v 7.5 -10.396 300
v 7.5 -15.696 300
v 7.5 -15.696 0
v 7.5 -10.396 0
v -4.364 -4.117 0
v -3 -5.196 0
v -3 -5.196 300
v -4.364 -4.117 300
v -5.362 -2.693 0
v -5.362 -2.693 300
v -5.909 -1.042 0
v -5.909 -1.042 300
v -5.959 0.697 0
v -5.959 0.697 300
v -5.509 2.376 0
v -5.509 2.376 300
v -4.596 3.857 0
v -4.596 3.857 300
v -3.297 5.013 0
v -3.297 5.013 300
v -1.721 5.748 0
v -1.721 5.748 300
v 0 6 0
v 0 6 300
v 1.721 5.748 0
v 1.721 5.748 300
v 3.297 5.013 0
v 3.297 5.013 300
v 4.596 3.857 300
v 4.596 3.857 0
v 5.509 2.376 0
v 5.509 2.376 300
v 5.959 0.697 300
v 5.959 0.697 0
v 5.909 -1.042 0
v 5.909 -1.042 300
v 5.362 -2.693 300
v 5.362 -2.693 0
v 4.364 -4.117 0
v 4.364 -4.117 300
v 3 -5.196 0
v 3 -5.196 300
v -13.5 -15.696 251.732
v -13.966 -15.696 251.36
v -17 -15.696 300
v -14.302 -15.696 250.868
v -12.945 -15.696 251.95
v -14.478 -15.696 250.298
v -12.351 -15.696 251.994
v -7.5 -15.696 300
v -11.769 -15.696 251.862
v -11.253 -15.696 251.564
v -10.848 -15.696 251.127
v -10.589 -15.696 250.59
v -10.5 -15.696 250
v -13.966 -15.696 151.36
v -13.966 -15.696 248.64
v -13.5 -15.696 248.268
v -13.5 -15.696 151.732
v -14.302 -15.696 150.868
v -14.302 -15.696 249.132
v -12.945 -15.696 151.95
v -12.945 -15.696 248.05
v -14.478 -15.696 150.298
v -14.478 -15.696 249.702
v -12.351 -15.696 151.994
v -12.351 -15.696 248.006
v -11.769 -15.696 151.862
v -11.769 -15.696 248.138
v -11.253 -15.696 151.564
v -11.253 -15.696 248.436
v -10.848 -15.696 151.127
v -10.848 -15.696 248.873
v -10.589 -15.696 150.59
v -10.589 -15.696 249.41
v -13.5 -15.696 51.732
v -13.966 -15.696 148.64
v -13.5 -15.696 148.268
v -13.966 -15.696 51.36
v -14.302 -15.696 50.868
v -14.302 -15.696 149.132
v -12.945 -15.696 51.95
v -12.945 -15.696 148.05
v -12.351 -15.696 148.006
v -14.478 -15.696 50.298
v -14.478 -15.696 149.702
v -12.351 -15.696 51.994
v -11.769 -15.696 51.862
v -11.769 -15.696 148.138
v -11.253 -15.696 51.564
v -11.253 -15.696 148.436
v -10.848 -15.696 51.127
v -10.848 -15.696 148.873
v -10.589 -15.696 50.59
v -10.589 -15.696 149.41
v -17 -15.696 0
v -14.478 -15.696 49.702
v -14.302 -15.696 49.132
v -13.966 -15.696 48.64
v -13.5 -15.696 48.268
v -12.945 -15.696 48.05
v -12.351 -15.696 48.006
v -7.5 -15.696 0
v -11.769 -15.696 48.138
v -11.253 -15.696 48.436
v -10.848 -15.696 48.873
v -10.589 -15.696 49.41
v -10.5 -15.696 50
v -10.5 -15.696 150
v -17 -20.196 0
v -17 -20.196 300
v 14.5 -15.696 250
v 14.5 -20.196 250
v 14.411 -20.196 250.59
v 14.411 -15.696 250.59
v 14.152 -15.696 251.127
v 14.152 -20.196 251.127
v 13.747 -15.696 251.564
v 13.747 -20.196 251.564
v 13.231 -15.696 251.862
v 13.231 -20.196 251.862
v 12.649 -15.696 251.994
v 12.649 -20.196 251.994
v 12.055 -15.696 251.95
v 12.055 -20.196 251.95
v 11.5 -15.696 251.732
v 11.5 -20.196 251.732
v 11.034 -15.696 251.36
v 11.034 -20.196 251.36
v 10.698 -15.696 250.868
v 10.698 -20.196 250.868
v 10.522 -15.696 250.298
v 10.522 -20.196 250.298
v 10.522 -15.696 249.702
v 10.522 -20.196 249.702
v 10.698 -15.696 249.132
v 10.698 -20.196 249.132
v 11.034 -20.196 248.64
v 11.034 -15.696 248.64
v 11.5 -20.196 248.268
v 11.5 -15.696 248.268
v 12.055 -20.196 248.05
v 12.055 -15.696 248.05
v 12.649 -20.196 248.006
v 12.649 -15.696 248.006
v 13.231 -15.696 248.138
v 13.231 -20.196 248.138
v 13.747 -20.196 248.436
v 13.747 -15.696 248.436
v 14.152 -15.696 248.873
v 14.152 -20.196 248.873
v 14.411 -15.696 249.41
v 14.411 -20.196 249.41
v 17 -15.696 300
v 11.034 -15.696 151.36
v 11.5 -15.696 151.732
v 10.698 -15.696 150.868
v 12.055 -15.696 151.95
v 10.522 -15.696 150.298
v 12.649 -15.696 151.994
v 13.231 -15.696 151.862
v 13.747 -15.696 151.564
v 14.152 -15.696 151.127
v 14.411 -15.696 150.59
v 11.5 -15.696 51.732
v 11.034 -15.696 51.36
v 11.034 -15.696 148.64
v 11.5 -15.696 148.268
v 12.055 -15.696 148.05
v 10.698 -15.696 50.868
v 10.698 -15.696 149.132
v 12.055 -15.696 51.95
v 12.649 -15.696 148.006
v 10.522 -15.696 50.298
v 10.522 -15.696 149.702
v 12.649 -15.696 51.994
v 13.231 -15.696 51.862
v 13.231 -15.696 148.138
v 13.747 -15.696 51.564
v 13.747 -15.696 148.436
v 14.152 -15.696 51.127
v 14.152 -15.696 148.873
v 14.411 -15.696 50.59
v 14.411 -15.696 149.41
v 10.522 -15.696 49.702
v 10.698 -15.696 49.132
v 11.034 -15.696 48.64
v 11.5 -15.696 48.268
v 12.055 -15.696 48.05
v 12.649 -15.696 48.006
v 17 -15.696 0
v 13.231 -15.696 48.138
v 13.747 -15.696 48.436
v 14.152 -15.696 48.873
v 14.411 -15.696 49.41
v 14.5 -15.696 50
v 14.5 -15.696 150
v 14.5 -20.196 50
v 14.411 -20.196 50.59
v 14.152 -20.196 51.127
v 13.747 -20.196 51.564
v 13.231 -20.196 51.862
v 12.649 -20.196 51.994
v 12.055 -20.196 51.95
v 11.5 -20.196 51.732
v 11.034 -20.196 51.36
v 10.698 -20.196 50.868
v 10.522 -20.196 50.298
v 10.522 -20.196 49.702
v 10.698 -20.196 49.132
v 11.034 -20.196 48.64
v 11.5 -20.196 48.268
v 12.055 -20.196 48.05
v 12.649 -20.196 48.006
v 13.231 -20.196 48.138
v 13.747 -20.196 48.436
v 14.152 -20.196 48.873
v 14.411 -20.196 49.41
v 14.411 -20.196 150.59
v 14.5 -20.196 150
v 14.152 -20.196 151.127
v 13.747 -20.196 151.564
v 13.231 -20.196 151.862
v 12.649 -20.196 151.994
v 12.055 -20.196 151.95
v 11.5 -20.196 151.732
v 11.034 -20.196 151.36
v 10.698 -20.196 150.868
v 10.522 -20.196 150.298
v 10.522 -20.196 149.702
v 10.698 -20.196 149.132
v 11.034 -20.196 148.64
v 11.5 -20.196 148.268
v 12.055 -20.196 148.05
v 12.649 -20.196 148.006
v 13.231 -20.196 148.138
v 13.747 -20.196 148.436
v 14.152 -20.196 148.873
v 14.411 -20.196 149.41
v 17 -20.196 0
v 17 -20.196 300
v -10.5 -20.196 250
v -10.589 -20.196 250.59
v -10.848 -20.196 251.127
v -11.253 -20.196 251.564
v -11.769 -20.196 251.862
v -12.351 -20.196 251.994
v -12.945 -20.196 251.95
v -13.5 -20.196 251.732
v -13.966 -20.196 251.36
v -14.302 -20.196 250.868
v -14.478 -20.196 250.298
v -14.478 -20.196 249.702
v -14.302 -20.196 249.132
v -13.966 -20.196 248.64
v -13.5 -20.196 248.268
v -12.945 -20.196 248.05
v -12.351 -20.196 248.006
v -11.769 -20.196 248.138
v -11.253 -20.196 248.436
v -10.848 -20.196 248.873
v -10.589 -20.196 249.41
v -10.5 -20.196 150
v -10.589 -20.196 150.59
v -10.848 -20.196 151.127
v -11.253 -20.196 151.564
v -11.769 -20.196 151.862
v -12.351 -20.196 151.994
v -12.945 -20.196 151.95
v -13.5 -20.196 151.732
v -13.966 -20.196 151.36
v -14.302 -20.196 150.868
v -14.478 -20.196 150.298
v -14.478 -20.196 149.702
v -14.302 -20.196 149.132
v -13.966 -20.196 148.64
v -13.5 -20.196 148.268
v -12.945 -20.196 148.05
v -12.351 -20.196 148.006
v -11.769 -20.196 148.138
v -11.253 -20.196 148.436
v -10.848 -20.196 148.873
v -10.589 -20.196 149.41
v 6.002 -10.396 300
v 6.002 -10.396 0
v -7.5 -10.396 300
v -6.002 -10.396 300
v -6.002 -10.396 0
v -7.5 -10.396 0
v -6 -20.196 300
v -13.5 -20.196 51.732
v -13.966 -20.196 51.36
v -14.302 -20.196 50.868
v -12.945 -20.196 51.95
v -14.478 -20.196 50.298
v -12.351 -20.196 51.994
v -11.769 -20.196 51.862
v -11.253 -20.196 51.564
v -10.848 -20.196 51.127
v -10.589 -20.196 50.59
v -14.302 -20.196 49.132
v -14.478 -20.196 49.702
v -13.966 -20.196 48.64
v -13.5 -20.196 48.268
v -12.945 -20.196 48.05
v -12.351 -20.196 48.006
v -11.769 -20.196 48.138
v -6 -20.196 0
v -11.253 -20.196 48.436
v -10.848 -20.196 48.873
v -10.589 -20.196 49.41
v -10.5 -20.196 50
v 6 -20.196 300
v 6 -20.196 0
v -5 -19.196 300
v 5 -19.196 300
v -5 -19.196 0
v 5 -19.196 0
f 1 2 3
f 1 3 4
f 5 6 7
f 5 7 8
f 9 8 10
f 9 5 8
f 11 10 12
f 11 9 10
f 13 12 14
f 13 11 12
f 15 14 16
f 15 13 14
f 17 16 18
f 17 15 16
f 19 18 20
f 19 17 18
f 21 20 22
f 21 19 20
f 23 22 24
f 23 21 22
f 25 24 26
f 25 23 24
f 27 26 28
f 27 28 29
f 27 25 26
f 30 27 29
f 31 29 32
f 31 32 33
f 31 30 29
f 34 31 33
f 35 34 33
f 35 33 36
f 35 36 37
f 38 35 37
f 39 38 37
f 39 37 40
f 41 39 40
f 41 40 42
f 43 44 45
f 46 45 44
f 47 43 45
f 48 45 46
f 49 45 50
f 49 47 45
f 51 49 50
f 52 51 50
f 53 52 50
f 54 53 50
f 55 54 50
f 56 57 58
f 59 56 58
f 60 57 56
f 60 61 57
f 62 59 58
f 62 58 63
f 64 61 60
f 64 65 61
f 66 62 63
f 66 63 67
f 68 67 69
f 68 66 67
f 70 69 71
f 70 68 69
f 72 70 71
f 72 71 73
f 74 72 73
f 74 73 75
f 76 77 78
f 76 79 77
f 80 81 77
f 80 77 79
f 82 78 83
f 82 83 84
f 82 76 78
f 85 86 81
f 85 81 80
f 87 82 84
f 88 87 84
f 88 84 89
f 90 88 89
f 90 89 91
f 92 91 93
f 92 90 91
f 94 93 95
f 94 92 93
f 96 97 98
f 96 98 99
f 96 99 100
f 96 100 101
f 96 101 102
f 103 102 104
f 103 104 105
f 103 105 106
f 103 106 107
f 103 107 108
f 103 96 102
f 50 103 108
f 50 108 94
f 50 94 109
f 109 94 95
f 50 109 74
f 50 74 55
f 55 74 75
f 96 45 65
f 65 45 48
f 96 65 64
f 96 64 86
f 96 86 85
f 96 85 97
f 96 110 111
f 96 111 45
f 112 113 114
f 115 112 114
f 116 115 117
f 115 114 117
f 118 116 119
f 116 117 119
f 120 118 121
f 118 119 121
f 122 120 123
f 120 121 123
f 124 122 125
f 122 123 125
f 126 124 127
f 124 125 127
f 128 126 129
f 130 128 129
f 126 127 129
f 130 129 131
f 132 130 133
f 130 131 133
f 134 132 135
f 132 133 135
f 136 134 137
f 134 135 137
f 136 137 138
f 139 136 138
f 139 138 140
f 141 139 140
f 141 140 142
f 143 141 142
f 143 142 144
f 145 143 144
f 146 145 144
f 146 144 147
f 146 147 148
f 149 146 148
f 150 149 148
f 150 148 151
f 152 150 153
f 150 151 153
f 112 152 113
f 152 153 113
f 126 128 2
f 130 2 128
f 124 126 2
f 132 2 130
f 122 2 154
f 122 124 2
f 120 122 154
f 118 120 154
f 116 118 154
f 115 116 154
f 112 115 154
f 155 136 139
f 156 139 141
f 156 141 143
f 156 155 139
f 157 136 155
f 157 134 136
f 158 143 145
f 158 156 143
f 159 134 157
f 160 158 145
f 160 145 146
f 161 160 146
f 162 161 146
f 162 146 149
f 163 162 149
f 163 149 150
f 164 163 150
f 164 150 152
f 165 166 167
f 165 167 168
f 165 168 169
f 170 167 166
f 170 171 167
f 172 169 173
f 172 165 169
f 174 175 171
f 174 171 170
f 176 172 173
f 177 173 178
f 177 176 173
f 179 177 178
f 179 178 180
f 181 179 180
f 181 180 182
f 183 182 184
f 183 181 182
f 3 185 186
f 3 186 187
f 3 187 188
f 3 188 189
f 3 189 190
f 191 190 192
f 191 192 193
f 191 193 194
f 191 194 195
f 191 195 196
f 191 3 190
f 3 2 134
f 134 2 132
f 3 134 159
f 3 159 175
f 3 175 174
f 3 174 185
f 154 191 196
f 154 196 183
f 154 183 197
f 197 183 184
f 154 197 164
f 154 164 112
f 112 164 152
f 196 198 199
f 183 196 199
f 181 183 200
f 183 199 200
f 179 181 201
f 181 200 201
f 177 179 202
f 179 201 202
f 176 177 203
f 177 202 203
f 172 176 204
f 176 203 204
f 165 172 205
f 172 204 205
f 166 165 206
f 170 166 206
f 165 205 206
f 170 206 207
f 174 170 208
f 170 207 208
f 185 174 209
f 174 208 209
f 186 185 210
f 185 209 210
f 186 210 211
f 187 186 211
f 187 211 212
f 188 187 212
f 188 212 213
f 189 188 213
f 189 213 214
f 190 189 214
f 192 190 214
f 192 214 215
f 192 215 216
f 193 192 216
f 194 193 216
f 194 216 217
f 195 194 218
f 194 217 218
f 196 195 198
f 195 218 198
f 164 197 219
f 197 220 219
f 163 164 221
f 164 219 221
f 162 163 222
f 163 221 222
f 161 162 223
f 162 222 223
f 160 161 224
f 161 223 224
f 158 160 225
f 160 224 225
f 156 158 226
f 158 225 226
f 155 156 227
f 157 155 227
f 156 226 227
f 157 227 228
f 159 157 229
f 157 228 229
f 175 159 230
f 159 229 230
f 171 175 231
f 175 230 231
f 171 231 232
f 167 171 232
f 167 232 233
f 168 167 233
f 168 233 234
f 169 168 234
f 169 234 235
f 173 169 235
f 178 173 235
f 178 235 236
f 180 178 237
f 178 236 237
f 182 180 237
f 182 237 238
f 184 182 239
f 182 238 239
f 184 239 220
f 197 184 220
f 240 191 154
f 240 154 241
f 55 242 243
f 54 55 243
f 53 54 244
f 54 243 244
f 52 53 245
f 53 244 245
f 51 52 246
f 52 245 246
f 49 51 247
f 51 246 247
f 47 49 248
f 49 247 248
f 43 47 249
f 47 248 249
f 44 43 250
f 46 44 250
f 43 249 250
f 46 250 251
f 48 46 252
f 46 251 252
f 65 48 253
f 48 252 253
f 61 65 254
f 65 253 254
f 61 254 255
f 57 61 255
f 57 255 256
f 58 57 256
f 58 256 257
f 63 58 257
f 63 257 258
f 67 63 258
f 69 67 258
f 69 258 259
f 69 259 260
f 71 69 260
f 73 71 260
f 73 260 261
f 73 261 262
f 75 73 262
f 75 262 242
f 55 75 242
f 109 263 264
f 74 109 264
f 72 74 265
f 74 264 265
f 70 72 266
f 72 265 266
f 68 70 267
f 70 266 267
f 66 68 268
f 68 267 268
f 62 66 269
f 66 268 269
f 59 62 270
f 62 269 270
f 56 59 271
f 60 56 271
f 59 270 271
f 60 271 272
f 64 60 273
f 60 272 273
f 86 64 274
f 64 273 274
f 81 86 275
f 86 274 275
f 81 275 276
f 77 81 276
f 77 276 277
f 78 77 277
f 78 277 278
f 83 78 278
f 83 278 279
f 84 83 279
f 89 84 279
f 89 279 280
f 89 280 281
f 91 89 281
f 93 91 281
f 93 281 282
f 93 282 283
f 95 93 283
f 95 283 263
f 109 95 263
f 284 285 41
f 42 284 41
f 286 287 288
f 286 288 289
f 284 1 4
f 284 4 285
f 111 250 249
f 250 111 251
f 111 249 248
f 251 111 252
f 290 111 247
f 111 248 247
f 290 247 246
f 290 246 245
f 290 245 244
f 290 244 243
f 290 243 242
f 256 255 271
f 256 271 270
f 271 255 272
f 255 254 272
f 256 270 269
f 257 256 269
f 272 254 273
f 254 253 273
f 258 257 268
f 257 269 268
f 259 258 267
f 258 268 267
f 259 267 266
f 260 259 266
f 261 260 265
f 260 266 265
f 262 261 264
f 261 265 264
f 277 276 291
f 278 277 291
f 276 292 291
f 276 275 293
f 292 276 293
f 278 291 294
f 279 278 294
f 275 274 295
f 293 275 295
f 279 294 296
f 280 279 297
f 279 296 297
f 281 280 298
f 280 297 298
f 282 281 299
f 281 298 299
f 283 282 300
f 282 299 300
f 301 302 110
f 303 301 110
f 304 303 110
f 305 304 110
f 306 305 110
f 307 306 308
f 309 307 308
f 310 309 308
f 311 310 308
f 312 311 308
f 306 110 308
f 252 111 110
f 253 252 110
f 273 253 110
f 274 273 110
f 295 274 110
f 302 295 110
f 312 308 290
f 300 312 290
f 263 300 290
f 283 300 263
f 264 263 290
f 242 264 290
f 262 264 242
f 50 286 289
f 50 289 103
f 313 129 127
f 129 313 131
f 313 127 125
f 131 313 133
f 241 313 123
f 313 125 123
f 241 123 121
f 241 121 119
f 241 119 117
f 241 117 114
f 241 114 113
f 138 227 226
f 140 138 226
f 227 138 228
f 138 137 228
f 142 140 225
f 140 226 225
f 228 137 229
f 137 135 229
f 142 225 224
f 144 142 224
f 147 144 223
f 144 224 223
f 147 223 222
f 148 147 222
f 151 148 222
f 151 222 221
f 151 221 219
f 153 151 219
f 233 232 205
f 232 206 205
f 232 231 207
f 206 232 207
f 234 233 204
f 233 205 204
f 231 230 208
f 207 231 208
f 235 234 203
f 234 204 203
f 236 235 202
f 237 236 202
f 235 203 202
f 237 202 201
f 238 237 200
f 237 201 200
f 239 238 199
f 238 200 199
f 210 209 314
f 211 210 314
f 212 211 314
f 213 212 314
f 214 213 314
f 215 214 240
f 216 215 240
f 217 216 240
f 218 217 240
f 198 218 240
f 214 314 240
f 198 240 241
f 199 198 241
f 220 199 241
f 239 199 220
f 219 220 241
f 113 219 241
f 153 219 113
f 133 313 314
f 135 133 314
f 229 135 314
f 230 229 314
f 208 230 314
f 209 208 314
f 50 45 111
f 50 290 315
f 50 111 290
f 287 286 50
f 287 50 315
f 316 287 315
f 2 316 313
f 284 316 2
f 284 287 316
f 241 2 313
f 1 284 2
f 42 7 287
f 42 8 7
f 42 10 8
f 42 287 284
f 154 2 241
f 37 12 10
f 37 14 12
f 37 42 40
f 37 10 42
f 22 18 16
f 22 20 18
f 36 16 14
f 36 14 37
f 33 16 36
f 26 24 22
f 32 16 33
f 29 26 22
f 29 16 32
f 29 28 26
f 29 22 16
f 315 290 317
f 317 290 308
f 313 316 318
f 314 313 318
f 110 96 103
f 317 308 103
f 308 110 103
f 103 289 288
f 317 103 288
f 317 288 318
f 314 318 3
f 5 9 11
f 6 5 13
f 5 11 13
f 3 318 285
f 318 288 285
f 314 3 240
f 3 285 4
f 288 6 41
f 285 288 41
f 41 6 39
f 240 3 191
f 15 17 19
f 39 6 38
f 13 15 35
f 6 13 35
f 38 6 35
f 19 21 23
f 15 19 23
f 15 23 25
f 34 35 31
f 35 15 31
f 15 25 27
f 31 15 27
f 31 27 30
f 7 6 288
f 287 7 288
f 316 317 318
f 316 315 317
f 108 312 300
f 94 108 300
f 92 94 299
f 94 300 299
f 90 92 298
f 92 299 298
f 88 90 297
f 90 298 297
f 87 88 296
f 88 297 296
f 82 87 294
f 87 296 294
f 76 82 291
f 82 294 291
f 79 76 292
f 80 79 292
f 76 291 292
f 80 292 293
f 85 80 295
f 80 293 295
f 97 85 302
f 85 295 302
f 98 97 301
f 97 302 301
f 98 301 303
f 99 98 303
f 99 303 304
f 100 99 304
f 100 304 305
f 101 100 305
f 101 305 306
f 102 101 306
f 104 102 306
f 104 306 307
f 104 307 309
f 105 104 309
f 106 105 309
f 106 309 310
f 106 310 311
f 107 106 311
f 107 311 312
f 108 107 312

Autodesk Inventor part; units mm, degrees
ref_plane "YZ Plane" through (0, 0, 0) normal (1, 0, 0) x (0, 1, 0)
ref_plane "XZ Plane" through (0, 0, 0) normal (0, 1, 0) x (-1, 0, 0)
ref_plane "XY Plane" through (0, 0, 0) normal (0, 0, 1) x (1, 0, 0)
sketch "Sketch1" plane through (0, 0, 0) normal (0, 0, 1) x (1, 0, 0)
  circle A0 centre (0, 0) radius 6
  line L0 (-3, -5.1962) -> (-6.0022, -10.3962)
  line L1 (-6.0022, -10.3962) -> (6.0022, -10.3962)
  line L2 (6.0022, -10.3962) -> (3, -5.1962)
  line L3 (-7.5, -20.1962) -> (7.5, -20.1962)
  line L4 (7.5, -20.1962) -> (7.5, -10.3962)
  line L5 (7.5, -10.3962) -> (-7.5, -10.3962)
  line L6 (-7.5, -10.3962) -> (-7.5, -20.1962)
  line L7 (0, -10.3962) -> (0, 0)
  line L8 (-17, -15.6962) -> (17, -15.6962)
  line L9 (17, -15.6962) -> (17, -20.1962)
  line L10 (17, -20.1962) -> (-17, -20.1962)
  line L11 (-17, -20.1962) -> (-17, -15.6962)
  point P0 (0, -20.1962)
  dimension "d0" = 12
  dimension "d1" = 60
  dimension "d2" = 3
  dimension "d3" = 3
  dimension "d4" = 15
  dimension "d5" = 9.8
  dimension "d6" = 15
  dimension "d7" = 4.5
  dimension "d8" = 34
extrude "Extrusion1" add sketch "Sketch1" along normal blind 300
sketch "Sketch2" plane through (0, 0, 300) normal (0, 0, 1) x (1, 0, 0)
  arc A0 (3, -5.1962) -> (-3, -5.1962) centre (0, 0) ccw projected
  line L0 (3, -5.1962) -> (6.0022, -10.3962) projected
  line L1 (6.0022, -10.3962) -> (7.5, -10.3962) projected
  line L2 (7.5, -10.3962) -> (7.5, -15.6962) projected
  line L3 (7.5, -15.6962) -> (17, -15.6962) projected
  line L4 (17, -15.6962) -> (17, -20.1962) projected
  line L5 (17, -20.1962) -> (-17, -20.1962) projected
  line L6 (-17, -20.1962) -> (-17, -15.6962) projected
  line L7 (-17, -15.6962) -> (-7.5, -15.6962) projected
  line L8 (-7.5, -15.6962) -> (-7.5, -10.3962) projected
  line L9 (-7.5, -10.3962) -> (-6.0022, -10.3962) projected
  line L10 (-6.0022, -10.3962) -> (-3, -5.1962) projected
  line L11 (-6, -19.1962) -> (6, -19.1962)
  line L12 (6, -19.1962) -> (6, -20.1962)
  line L13 (6, -20.1962) -> (-6, -20.1962)
  line L14 (-6, -20.1962) -> (-6, -19.1962)
  point P0 (0, -20.1962)
  dimension "d11" = 12
  dimension "d12" = 1
extrude "Extrusion2" cut sketch "Sketch2" against normal through all contours L5 L14 L11 L12
chamfer "Chamfer1" distance 1 angle 45 2 edges at (-6, -19.1962, 150) (6, -19.1962, 150)
sketch "Sketch3" plane through (-17, -20.1962, 0) normal (0, -1, 0) x (1, 0, 0)
  line L0 (23, 0) -> (23, 300) construction
  line L1 (23, 300) -> (34, 300) projected
  line L2 (34, 300) -> (34, 0) projected
  line L3 (34, 0) -> (23, 0) construction
  line L4 (11, 300) -> (11, 0) construction
  line L5 (11, 0) -> (0, 0) construction
  line L6 (0, 0) -> (0, 300) projected
  line L7 (0, 300) -> (11, 300) projected
  circle A0 centre (4.5, 50) radius 2
  circle A1 centre (29.5, 50) radius 2
  line L8 (29.5, 50) -> (4.5, 50) construction
  line L9 (17, 50) -> (17, 0) construction
  dimension "d18" = 50
  dimension "d19" = 4
  dimension "d20" = 4
  dimension "d21" = 25
extrude "Extrusion3" cut sketch "Sketch3" against normal through all
thread "Thread1" size "M4x0.7" class "6H" standard "ANSI Metric M Profile" full length
thread "Thread2" size "M4x0.7" class "6H" standard "ANSI Metric M Profile" full length
pattern_linear "Rectangular Pattern1" count 3 spacing 100 along (0, 0, 1) of "Extrusion3"
properties part number "sbr12_300mm"
